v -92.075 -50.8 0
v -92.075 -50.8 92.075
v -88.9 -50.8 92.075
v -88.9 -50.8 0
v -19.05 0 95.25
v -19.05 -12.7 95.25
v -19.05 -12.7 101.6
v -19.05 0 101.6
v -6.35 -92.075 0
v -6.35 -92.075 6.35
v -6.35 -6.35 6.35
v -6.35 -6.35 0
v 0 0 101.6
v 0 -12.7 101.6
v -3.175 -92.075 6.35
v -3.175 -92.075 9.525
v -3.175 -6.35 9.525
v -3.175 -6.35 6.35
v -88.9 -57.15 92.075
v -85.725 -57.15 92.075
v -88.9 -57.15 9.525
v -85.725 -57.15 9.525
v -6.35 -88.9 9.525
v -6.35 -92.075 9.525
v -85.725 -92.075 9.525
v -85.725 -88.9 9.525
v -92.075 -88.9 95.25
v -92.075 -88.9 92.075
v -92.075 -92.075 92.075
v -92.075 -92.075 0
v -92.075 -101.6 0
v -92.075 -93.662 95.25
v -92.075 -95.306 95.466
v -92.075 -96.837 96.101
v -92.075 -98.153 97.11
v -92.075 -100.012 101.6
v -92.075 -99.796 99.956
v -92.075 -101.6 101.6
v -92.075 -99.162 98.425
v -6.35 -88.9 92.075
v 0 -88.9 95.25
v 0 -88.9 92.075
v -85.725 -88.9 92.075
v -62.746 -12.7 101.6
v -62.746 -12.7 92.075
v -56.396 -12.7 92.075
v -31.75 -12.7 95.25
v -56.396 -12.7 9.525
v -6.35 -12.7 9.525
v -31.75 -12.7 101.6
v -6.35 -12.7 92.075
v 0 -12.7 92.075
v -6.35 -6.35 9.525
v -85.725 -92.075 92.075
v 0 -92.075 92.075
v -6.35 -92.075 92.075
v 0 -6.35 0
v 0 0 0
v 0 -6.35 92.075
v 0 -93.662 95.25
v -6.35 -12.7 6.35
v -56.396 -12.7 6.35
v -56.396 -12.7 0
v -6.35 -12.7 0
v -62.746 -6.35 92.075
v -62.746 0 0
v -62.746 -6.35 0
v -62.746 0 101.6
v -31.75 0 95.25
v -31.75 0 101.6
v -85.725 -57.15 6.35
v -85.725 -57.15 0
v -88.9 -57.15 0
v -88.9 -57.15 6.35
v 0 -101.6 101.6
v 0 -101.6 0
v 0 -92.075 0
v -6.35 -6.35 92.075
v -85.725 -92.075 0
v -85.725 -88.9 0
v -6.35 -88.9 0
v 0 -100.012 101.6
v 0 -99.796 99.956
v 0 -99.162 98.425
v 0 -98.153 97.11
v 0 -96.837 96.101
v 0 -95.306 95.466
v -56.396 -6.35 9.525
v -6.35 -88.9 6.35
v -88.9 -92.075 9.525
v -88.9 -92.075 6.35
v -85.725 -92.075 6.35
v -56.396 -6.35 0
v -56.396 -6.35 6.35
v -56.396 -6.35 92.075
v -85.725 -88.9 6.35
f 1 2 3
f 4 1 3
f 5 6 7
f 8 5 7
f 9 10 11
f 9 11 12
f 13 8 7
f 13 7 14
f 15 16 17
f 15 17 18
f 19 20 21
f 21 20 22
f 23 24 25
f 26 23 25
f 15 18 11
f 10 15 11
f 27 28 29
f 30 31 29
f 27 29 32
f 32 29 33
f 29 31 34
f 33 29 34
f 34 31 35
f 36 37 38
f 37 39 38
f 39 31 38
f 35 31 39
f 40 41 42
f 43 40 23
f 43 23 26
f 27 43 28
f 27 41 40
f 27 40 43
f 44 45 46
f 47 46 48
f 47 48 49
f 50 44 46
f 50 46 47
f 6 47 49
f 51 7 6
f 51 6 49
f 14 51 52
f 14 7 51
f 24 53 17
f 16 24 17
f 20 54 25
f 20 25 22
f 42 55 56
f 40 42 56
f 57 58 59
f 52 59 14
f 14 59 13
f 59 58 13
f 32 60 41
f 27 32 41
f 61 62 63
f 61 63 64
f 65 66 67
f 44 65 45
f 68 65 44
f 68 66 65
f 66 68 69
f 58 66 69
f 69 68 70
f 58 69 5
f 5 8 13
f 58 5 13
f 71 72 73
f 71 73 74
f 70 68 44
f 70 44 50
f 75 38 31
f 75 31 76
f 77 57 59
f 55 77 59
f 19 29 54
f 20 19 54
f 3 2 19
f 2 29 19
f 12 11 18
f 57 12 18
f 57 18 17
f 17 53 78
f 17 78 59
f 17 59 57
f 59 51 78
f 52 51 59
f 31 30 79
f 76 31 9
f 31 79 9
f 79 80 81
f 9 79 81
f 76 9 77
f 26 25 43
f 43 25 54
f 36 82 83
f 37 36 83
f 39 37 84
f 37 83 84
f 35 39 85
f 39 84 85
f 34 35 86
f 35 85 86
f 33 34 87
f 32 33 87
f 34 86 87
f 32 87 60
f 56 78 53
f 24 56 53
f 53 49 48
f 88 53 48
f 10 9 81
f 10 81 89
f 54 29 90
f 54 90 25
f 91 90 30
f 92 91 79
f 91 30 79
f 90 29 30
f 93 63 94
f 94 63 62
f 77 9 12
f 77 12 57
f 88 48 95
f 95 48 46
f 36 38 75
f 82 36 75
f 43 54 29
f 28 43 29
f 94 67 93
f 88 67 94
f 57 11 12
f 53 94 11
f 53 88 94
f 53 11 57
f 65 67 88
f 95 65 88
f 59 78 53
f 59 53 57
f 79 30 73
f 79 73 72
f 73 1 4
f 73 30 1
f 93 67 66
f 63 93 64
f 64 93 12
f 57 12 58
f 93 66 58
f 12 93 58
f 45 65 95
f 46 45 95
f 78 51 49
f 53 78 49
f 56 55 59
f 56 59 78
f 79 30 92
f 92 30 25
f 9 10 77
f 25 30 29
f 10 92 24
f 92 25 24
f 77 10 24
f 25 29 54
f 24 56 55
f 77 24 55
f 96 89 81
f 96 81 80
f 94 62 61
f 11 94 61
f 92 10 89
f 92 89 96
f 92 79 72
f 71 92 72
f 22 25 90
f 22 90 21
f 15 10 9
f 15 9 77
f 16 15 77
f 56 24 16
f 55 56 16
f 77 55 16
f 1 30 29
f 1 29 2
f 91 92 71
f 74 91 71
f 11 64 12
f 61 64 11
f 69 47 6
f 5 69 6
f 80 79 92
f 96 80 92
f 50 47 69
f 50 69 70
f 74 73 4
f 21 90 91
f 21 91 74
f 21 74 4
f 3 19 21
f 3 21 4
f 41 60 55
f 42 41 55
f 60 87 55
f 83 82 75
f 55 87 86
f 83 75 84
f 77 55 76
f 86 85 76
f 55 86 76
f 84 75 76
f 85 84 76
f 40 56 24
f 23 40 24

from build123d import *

# Parameters (mm, degrees)
F1_W      = 62.7456063252
F1_H      = 101.6
F2_DEPTH  = 12.7
F3_W      = 6.35
F3_H      = 82.55
F3_H_2    = 3.175
F3_W_2    = 50.0456063252
F3_H_3    = 6.35
F4_DEPTH  = 6.35
F6_DEPTH  = 85.725
F7_W      = 92.075
F7_H      = 101.6
F8_DEPTH  = 9.525
F9_W      = 79.375
F9_H      = 6.35
F10_DEPTH = 3.175
F12_DEPTH = 92.075
F13_W     = 12.7
F13_H     = 6.35
F14_DEPTH = 12.7
F15_W     = 6.35
F15_H     = 41.275
F16_DEPTH = 92.075
F17_W     = 6.35
F17_H     = 3.175
F17_H_2   = 82.55
F17_W_2   = 34.925
F17_H_3   = 6.35
F18_DEPTH = 3.175


with BuildPart() as f2:
    # F1 (on Front) → F2 (new body)
    with BuildSketch(Plane.XZ):
        with Locations((-31.3728031626, 50.8)):
            Rectangle(F1_W, F1_H)
    extrude(amount=F2_DEPTH)

    # F3 (on face) → F4 (cut)
    with BuildSketch(Plane.XZ.offset(12.7)):
        with Locations((-3.175, 50.8)):
            Rectangle(F3_W, F3_H)
        with Locations((-3.175, 7.9375)):
            Rectangle(F3_W, F3_H_2)
        with Locations((-31.3728031626, 7.9375)):
            Rectangle(F3_W_2, F3_H_2)
        with Locations((-3.175, 3.175)):
            Rectangle(F3_W, F3_H_3)
        with Locations((-59.5706063252, 7.9375)):
            Rectangle(F3_W, F3_H_2)
        with Locations((-59.5706063252, 50.8)):
            Rectangle(F3_W, F3_H)
        with Locations((-59.5706063252, 3.175)):
            Rectangle(F3_W, F3_H_3)
    extrude(amount=-F4_DEPTH, mode=Mode.SUBTRACT)

    # F13 (on face) → F14 (cut, through all)
    with BuildSketch(Plane.XZ.offset(12.7)):
        with Locations((-25.4, 98.425)):
            Rectangle(F13_W, F13_H)
    extrude(amount=-F14_DEPTH, mode=Mode.SUBTRACT)


with BuildPart() as f6:
    # F5 (on face) → F6 (new body)
    with BuildSketch(Plane.XZ.offset(6.35)):
        Polygon((0, 92.075), (-6.35, 92.075), (-6.35, 9.525), (-3.175, 9.525), (-3.175, 6.35), (-6.35, 6.35), (-6.35, 0), (0, 0), align=None)
    extrude(amount=F6_DEPTH)


with BuildPart() as f8:
    # F7 (on face) → F8 (new body)
    with BuildSketch(Plane.XZ.offset(92.075)):
        with Locations((-46.0375, 50.8)):
            Rectangle(F7_W, F7_H)
    extrude(amount=F8_DEPTH)

    # F9 (on face) → F10 (join)
    with BuildSketch(Plane(origin=(0, -92.075, 0), x_dir=(-1, 0, 0), z_dir=(0, 1, 0))):
        with Locations((46.0375, 3.175)):
            Rectangle(F9_W, F9_H)
        Polygon((92.075, 101.6), (0, 101.6), (0, 92.075), (6.35, 92.075), (6.35, 9.525), (85.725, 9.525), (85.725, 92.075), (92.075, 92.075), align=None)
    extrude(amount=F10_DEPTH)

    # F11 (on face) → F12 (cut, through all)
    with BuildSketch(Plane.YZ):
        with BuildLine():
            Line((-93.6625, 101.6), (-100.0125, 101.6))
            ThreePointArc((-100.0125, 101.6), (-98.1526280605, 97.1098719395), (-93.6625, 95.25))
            Line((-93.6625, 95.25), (-88.9, 95.25))
            Line((-88.9, 95.25), (-88.9, 101.6))
            Line((-88.9, 101.6), (-93.6625, 101.6))
        make_face()
    extrude(amount=-F12_DEPTH, mode=Mode.SUBTRACT)


with BuildPart() as f16:
    # F15 (on Top) → F16 (new body, through all)
    with BuildSketch(Plane.XY):
        with Locations((-88.9, -71.4375)):
            Rectangle(F15_W, F15_H)
    extrude(amount=F16_DEPTH)

    # F17 (on face) → F18 (cut)
    with BuildSketch(Plane.YZ.offset(-85.725)):
        with Locations((-53.975, 7.9375)):
            Rectangle(F17_W, F17_H)
        with Locations((-53.975, 50.8)):
            Rectangle(F17_W, F17_H_2)
        with Locations((-74.6125, 7.9375)):
            Rectangle(F17_W_2, F17_H)
        with Locations((-53.975, 3.175)):
            Rectangle(F17_W, F17_H_3)
    extrude(amount=-F18_DEPTH, mode=Mode.SUBTRACT)


solid = Compound([f2.part, f6.part, f8.part, f16.part])
